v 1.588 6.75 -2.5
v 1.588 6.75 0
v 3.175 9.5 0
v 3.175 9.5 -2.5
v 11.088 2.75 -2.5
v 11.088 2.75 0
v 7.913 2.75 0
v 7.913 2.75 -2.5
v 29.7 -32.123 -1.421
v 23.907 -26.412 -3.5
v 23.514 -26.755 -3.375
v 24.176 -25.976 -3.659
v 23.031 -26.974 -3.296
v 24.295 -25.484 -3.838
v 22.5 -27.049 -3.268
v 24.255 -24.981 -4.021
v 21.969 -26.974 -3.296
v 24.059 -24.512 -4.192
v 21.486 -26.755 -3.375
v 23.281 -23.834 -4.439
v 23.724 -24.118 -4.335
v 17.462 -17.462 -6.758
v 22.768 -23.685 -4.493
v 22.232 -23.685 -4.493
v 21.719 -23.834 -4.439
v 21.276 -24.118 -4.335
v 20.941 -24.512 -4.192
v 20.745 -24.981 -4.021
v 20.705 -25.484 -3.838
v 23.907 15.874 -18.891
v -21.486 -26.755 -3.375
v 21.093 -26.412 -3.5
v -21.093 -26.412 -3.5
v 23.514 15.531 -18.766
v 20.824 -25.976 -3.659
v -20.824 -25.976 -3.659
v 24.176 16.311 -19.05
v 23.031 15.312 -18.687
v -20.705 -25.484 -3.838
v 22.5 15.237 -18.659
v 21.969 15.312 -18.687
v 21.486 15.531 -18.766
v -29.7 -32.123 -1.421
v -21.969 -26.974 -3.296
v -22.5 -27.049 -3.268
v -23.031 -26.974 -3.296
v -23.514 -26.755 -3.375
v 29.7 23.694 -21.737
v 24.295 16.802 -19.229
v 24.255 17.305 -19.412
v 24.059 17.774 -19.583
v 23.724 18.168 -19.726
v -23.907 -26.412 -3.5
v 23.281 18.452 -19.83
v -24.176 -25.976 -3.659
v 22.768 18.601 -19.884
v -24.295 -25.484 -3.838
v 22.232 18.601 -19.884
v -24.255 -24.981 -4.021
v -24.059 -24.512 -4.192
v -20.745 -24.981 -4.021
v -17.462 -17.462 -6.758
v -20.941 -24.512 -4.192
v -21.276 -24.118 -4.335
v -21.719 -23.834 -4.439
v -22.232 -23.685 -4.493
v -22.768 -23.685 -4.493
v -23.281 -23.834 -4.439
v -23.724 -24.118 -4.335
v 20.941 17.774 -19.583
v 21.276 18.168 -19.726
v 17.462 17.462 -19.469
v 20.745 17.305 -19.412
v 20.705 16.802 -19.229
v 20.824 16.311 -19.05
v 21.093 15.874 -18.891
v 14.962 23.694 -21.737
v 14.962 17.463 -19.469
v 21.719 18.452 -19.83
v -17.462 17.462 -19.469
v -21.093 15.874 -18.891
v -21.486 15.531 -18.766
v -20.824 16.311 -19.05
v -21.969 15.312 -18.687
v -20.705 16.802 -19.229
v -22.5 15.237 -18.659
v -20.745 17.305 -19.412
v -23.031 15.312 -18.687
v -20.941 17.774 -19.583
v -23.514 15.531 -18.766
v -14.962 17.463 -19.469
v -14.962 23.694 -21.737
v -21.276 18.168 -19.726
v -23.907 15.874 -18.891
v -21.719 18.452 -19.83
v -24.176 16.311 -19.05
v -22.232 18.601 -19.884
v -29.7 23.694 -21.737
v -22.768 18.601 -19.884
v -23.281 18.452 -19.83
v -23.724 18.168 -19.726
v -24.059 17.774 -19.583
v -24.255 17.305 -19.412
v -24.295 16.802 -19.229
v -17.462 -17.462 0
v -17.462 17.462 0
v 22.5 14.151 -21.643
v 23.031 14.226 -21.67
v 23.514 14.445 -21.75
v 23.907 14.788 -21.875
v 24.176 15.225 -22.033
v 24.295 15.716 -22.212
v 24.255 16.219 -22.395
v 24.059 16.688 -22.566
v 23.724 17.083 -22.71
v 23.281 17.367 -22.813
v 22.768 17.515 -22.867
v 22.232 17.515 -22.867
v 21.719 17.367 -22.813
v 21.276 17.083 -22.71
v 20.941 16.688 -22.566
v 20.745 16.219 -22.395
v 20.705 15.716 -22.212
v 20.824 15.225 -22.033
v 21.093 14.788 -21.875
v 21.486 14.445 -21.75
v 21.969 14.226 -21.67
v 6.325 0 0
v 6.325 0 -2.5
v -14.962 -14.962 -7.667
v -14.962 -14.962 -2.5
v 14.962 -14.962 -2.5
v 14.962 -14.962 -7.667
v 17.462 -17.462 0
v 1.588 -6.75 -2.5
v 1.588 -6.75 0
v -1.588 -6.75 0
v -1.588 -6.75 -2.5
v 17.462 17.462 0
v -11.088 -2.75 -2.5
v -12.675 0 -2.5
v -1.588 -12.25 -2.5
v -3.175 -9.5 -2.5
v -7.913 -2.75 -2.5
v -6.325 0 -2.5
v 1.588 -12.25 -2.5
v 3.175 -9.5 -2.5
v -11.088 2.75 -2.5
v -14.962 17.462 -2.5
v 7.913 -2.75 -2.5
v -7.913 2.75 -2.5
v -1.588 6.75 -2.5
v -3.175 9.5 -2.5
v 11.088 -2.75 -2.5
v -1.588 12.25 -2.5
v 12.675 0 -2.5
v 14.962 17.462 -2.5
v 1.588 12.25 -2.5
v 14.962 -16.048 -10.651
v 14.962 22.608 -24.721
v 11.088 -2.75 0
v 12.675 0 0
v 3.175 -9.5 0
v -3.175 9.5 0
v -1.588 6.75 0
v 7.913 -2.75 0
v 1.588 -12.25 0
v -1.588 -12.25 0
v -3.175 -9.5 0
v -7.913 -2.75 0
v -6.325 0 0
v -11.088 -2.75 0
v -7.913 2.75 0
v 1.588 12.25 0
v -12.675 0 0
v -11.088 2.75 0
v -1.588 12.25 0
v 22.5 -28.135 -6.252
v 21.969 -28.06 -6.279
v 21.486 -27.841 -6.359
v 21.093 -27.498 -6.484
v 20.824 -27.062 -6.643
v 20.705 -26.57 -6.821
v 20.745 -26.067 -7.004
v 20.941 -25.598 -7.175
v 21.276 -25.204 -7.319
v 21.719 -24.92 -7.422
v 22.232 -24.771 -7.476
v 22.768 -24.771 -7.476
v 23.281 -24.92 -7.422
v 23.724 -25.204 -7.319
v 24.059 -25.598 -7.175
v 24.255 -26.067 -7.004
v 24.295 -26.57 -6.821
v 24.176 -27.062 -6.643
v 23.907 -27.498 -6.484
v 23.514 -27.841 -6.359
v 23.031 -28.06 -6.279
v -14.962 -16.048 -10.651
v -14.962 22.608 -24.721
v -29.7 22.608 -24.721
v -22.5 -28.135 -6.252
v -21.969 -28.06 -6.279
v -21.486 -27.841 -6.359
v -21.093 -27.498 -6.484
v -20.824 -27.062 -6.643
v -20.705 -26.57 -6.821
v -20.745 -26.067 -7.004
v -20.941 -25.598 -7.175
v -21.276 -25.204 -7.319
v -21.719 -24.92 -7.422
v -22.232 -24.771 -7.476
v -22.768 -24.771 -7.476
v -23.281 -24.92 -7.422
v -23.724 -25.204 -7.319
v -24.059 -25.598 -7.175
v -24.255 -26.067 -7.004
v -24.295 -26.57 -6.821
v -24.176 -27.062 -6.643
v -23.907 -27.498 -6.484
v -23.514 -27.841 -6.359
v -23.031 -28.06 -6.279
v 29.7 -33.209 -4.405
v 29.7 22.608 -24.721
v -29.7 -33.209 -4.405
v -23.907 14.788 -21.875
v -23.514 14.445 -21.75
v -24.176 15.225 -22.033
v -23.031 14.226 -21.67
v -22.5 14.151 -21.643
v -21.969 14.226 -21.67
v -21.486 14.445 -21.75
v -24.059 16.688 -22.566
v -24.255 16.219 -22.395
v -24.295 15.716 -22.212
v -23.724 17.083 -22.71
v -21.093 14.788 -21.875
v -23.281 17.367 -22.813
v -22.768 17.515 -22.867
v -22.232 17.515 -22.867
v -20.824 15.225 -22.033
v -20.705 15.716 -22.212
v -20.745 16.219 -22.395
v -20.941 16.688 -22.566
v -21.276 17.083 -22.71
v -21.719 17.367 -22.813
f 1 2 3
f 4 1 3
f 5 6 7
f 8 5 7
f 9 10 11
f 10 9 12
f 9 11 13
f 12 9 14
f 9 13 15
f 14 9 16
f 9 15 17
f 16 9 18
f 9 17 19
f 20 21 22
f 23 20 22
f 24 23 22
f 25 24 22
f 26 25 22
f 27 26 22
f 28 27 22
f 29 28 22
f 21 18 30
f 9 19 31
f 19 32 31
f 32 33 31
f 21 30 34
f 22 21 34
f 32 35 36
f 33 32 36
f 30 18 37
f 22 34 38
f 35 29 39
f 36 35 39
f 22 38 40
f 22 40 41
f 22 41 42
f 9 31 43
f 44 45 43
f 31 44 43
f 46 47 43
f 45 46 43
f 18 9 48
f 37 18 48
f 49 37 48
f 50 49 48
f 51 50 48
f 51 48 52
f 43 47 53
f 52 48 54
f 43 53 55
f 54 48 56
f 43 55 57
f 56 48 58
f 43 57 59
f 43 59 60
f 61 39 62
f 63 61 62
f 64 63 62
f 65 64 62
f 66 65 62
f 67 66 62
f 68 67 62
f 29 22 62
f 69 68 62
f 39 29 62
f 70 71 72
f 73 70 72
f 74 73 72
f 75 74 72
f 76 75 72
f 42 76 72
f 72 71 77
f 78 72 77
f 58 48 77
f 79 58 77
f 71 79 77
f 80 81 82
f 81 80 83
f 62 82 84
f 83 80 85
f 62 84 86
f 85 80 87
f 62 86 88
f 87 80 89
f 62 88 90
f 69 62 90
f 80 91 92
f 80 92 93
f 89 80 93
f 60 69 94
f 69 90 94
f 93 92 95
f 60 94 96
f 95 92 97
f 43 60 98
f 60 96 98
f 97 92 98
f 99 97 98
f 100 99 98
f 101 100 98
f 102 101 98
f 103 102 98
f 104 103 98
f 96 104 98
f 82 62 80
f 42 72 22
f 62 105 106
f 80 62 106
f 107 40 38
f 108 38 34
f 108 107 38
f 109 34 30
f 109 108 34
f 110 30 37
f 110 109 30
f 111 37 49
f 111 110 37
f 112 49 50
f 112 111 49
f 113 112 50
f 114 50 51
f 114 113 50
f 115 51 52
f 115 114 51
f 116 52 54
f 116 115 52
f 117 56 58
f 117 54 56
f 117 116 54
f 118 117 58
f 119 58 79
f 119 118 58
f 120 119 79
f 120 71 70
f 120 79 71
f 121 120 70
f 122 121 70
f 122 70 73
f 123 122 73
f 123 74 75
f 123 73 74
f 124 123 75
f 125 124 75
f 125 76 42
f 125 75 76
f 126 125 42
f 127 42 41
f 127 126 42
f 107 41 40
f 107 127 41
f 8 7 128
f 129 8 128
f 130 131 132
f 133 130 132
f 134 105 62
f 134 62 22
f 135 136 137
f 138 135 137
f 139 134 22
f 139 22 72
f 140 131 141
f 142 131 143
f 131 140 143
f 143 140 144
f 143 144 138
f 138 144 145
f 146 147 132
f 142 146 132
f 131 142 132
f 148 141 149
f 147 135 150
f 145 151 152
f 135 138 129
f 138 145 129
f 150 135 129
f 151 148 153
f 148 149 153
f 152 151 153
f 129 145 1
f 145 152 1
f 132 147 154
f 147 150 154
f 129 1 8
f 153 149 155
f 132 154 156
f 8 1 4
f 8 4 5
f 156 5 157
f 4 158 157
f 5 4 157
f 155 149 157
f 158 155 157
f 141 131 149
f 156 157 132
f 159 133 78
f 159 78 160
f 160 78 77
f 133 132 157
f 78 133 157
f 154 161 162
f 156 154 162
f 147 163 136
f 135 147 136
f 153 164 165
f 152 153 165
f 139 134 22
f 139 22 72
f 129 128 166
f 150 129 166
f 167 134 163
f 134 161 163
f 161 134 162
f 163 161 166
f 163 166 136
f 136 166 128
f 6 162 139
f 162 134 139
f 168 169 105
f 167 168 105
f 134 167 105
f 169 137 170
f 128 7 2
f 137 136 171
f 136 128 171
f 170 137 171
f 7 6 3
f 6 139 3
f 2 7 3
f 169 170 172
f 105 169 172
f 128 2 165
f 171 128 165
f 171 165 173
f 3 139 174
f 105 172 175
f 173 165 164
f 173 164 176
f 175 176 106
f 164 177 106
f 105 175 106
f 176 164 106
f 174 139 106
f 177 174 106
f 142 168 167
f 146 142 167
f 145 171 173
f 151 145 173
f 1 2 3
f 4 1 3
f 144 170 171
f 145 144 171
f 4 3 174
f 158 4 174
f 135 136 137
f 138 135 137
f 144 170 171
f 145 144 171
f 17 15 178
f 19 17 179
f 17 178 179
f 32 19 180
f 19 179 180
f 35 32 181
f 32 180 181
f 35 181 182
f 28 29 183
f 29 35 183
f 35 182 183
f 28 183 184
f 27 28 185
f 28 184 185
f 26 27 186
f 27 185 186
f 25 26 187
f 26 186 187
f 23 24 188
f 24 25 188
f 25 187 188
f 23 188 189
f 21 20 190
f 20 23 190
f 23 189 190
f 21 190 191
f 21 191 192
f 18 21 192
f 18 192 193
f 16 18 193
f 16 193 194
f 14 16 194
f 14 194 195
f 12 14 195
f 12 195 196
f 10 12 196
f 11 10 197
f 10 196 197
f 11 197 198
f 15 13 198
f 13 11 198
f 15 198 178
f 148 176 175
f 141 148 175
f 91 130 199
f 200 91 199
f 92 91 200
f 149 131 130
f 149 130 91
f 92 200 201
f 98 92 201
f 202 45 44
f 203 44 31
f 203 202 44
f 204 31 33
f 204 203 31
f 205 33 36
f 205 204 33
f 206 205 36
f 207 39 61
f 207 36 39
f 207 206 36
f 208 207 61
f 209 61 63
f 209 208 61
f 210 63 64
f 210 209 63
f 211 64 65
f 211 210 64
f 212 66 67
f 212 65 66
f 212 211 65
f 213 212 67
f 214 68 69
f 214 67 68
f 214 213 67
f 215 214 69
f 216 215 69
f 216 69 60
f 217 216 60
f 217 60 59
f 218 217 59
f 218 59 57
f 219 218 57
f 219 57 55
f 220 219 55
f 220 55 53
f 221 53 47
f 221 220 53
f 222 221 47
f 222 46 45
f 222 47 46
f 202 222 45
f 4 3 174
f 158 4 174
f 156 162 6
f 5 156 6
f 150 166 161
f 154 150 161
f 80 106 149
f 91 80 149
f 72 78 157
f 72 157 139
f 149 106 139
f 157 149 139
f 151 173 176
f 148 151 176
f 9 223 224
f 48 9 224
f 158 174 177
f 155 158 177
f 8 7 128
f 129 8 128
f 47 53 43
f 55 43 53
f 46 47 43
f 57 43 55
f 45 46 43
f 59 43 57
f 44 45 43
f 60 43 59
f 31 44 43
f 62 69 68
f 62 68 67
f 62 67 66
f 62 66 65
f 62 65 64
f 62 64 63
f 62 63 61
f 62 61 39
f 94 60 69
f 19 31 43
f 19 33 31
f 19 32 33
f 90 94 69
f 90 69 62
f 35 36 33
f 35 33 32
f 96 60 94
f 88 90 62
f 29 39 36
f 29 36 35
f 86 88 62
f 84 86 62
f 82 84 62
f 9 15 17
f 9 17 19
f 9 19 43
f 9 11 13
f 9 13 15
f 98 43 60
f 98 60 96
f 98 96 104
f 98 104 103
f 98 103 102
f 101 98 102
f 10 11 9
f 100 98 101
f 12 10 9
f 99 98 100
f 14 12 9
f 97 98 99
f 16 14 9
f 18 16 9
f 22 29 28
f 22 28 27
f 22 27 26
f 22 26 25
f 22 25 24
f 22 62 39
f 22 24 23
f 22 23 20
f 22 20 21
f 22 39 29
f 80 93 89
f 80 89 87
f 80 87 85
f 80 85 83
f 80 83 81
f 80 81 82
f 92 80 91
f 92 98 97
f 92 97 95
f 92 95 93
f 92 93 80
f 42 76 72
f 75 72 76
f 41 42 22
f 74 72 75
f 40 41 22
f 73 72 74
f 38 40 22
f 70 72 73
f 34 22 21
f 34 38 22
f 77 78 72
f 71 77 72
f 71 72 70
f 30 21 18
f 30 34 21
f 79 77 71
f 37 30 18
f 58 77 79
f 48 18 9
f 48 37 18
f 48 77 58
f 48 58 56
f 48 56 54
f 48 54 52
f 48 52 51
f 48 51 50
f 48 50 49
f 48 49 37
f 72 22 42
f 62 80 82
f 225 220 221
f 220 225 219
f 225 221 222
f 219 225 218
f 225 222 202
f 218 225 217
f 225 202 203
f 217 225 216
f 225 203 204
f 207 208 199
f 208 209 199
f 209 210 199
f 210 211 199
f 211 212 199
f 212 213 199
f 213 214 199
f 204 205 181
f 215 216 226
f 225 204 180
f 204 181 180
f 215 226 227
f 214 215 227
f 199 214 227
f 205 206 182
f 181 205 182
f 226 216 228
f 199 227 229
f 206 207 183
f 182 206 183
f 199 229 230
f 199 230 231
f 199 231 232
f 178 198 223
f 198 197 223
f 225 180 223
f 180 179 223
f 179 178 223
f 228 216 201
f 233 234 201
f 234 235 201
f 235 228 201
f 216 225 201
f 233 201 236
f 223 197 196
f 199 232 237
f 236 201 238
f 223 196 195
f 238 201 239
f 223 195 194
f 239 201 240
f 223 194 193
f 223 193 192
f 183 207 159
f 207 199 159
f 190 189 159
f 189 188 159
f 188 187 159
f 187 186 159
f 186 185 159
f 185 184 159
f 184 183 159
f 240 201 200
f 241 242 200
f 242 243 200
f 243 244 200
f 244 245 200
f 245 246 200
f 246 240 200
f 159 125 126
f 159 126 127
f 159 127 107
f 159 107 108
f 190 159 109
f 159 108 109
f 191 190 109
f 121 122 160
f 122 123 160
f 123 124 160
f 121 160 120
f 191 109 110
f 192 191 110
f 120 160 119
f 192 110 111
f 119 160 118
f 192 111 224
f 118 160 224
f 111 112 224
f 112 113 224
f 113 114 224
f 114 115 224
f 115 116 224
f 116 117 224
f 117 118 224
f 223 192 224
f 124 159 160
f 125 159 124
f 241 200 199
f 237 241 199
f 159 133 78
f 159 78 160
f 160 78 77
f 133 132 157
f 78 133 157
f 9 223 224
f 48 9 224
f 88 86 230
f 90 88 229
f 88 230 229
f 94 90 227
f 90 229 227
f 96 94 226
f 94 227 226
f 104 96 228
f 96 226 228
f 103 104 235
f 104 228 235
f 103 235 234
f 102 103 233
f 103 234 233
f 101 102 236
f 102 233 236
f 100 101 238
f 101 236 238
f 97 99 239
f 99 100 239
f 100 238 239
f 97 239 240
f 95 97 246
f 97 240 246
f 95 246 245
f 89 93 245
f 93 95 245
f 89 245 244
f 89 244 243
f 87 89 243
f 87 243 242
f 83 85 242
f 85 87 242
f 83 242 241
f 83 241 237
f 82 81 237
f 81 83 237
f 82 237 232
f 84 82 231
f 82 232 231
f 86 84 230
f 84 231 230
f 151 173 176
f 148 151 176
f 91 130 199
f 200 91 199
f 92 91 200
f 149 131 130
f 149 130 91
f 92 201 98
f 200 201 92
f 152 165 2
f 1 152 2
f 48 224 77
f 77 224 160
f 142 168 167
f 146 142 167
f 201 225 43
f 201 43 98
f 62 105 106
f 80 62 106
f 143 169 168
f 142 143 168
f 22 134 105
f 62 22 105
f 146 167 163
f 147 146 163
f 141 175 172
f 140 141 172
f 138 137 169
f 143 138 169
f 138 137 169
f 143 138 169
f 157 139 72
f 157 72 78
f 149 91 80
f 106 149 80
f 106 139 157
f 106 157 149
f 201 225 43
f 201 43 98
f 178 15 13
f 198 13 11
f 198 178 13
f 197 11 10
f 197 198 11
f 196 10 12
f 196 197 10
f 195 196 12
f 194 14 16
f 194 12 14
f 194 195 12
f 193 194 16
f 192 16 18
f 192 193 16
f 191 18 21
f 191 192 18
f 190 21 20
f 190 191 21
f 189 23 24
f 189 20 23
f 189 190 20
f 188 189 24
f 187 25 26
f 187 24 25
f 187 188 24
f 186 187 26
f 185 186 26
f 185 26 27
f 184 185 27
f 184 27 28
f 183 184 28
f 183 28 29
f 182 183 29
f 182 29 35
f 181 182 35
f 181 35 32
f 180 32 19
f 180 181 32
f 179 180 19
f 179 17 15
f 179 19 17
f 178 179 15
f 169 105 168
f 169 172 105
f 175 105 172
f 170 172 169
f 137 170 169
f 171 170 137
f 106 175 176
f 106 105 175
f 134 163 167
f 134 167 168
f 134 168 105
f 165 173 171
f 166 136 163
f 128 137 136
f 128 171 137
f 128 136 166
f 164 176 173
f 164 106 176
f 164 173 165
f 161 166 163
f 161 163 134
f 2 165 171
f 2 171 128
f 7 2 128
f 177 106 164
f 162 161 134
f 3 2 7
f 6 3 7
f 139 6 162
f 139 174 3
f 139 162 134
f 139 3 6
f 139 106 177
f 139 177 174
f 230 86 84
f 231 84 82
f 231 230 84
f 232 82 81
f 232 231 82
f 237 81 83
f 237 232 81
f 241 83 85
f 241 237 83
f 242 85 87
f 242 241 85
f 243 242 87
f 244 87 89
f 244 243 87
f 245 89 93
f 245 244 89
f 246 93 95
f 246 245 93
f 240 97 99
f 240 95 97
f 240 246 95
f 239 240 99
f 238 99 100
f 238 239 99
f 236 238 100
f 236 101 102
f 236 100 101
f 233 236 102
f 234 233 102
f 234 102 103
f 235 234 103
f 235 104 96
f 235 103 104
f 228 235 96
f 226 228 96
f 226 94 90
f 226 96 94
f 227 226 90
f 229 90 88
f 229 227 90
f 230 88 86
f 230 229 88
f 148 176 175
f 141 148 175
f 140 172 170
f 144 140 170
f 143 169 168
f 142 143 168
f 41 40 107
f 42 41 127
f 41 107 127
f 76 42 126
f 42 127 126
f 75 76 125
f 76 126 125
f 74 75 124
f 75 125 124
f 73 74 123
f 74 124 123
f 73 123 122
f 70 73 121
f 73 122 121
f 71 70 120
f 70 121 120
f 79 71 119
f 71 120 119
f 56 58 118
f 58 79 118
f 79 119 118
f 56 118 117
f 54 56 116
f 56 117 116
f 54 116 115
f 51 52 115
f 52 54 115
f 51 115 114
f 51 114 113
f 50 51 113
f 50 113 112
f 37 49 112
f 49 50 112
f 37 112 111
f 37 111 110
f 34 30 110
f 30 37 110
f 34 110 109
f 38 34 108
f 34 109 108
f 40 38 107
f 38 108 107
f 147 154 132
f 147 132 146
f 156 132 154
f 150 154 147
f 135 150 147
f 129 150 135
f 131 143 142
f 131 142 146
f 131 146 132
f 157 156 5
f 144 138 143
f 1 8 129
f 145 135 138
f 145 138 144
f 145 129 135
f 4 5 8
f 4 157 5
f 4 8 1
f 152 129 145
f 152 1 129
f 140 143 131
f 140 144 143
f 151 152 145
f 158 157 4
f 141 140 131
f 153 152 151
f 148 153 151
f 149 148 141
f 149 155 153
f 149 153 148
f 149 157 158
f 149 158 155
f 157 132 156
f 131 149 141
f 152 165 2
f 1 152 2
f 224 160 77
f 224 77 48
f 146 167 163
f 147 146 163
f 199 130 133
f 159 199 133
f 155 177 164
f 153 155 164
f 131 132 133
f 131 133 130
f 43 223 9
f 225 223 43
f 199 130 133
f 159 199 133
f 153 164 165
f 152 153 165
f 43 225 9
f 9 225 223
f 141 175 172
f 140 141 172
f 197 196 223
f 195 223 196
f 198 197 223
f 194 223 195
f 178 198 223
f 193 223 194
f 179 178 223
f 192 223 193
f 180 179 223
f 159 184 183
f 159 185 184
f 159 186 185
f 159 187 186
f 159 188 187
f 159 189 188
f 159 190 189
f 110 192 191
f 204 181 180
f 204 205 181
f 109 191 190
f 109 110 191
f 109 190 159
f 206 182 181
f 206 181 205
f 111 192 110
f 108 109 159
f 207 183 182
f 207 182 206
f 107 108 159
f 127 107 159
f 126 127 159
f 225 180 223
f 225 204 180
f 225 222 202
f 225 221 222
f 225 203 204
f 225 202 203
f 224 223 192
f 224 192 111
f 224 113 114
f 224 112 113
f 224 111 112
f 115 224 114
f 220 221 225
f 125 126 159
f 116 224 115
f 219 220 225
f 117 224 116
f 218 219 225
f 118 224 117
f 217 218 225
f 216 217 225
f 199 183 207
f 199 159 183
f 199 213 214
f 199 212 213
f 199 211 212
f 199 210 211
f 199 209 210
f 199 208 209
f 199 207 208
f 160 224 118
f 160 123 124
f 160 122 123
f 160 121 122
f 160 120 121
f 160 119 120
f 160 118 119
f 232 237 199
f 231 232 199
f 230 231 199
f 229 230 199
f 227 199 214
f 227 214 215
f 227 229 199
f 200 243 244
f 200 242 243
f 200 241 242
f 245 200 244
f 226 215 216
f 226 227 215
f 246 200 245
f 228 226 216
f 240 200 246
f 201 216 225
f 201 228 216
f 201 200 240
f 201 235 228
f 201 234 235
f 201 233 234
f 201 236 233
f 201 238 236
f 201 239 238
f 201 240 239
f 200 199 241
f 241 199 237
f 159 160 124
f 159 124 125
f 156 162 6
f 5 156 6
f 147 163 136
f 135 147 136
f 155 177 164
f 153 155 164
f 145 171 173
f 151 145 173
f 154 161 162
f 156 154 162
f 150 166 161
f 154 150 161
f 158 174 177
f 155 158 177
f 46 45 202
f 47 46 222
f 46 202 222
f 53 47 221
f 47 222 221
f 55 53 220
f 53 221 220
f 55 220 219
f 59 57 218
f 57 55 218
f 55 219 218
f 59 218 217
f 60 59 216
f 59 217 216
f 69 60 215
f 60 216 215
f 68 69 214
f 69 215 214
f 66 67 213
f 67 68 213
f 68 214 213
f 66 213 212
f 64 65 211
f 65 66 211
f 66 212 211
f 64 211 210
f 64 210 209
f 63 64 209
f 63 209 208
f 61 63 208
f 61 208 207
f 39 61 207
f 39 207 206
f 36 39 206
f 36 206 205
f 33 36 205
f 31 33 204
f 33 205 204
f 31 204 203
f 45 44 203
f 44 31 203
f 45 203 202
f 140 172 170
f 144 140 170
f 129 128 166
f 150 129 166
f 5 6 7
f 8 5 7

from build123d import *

# Parameters (mm, degrees)
SKETCH5_W           = 59.399999564
SKETCH5_H           = 59.399999564
BOSS_EXTRUDE3_DEPTH = 3.175
BOSS_EXTRUDE4_REACH = 52.952
SKETCH1_W           = 34.925
SKETCH1_H           = 34.925
SKETCH5_5_R         = 1.799999956
CUT_EXTRUDE5_DEPTH  = 44.987110755
SHELL1_T            = -2.5
SKETCH8_R           = 1.56250005
CUT_EXTRUDE4_DEPTH  = 2.5
SKETCH10_W          = 10
SKETCH10_H          = 6
CUT_EXTRUDE7_DEPTH  = 3.175
CUT_EXTRUDE9_DEPTH  = 2.5
SKETCH16_W          = 29.925
SKETCH16_H          = 41.137726754
CUT_EXTRUDE11_DEPTH = 44.537192462


# Read off the part's stored shape, not the designer's step: Split1
with BuildPart() as part:
    # Sketch5 → Boss-Extrude3 (new body)
    with BuildSketch(Plane(origin=(0, -5.300466321, -14.56291153), x_dir=(1, 0, 0), z_dir=(0, 0.3420201433256694, 0.9396926207859082))):
        Rectangle(SKETCH5_W, SKETCH5_H)
    extrude(amount=BOSS_EXTRUDE3_DEPTH)

    # Boss-Extrude4: up to this plane
    boss_extrude4_end = Plane(origin=(0, -4.214552366, -11.579387459), z_dir=(0, 0.34202014332566943, 0.9396926207859083))
    # Sketch1 → Boss-Extrude4 (add, up to the surface)
    with BuildSketch(Plane.XY, mode=Mode.PRIVATE) as boss_extrude4_sk1:
        Rectangle(SKETCH1_W, SKETCH1_H)
    boss_extrude4_tool1 = split(extrude(boss_extrude4_sk1.sketch, amount=-BOSS_EXTRUDE4_REACH, mode=Mode.PRIVATE), bisect_by=boss_extrude4_end, keep=Keep.BOTH, mode=Mode.PRIVATE)
    add(boss_extrude4_tool1.solids().sort_by_distance((0, 0, 0))[0])

    # Sketch5<5> → Cut-Extrude5 (cut, through all)
    with BuildSketch(Plane(origin=(0, -5.300466321, -14.56291153), x_dir=(1, 0, 0), z_dir=(0, 0.3420201433256694, 0.9396926207859082))):
        with Locations(Location((-22.499999958, -22.499999958, 0), (0, 0, 270))):
            Circle(SKETCH5_5_R)
        with Locations(Location((-22.499999958, 22.499999958, 0), (0, 0, 270))):
            Circle(SKETCH5_5_R)
        with Locations(Location((22.499999958, 22.499999958, 0), (0, 0, 270))):
            Circle(SKETCH5_5_R)
        with Locations(Location((22.499999958, -22.499999958, 0), (0, 0, 270))):
            Circle(SKETCH5_5_R)
    extrude(amount=CUT_EXTRUDE5_DEPTH, mode=Mode.SUBTRACT)


with BuildPart() as body_2:
    # Split1: the piece on the far side of the plane
    add(part.part)
    split(bisect_by=Plane(origin=(0, -4.214552366, -11.579387459), x_dir=(1, 0, 0), z_dir=(0, 0.3420201433256691, 0.9396926207859083)), keep=Keep.BOTTOM)


with BuildPart() as part_1:
    add(part.part)

    # Split1
    split(bisect_by=Plane(origin=(0, -4.214552366, -11.579387459), x_dir=(1, 0, 0), z_dir=(0, 0.3420201433256691, 0.9396926207859083)), keep=Keep.TOP)

    # Shell1
    shell1_openings = [part_1.faces().sort_by_distance(p)[0] for p in [
        (0, 17.4625, -9.734594643),
        (0, 0, -13.113359071),
    ]]
    offset(amount=SHELL1_T, openings=shell1_openings, kind=Kind.INTERSECTION)

    # Sketch8 → Cut-Extrude4 (cut)
    with BuildSketch(Plane.XY):
        with Locations((0, 9.50000005)):
            Circle(SKETCH8_R)
        with Locations((9.50000005, 0)):
            Circle(SKETCH8_R)
        with Locations((0, -9.50000005)):
            Circle(SKETCH8_R)
        with Locations((-9.50000005, 0)):
            Circle(SKETCH8_R)
    extrude(amount=-CUT_EXTRUDE4_DEPTH, mode=Mode.SUBTRACT)

    # Combine1: union body 2
    add(body_2.part)


with BuildPart() as body_2_2:
    # Mirror4: mirrored copy
    add(part_1.part.mirror(Plane(origin=(0, 0, 0), x_dir=(0, 0, 1), z_dir=(1, 0, 0))))


with BuildPart() as cut_extrude7_tool:
    # Sketch10 → Cut-Extrude7 (new body)
    with BuildSketch(Plane(origin=(0, -5.300466321, -14.56291153), x_dir=(-1, 0, 0), z_dir=(0, -0.3420201433256695, -0.9396926207859082))):
        with Locations((4, 11)):
            Rectangle(SKETCH10_W, SKETCH10_H)
    extrude(amount=-CUT_EXTRUDE7_DEPTH)


with BuildPart() as part_2:
    add(part_1.part)

    # Cut-Extrude7: cut by cut_extrude7_tool
    add(cut_extrude7_tool.part, mode=Mode.SUBTRACT)


with BuildPart() as body_2_2_1:
    add(body_2_2.part)

    # Cut-Extrude7: cut by cut_extrude7_tool
    add(cut_extrude7_tool.part, mode=Mode.SUBTRACT)


with BuildPart() as cut_extrude9_tool:
    # Sketch11 → Cut-Extrude9 (new body)
    with BuildSketch(Plane.XY):
        Polygon((1.5875, 12.249630707), (-1.5875, 12.249630707), (-3.175, 9.50000005), (-1.5875, 6.750369393), (1.5875, 6.750369393), (3.175, 9.50000005), align=None)
        Polygon((11.08750005, 2.749630657), (7.91250005, 2.749630657), (6.32500005, 0), (7.91250005, -2.749630657), (11.08750005, -2.749630657), (12.67500005, 0), align=None)
        Polygon((1.5875, -6.750369393), (-1.5875, -6.750369393), (-3.175, -9.50000005), (-1.5875, -12.249630707), (1.5875, -12.249630707), (3.175, -9.50000005), align=None)
        Polygon((-7.91250005, 2.749630657), (-11.08750005, 2.749630657), (-12.67500005, 0), (-11.08750005, -2.749630657), (-7.91250005, -2.749630657), (-6.32500005, 0), align=None)
    extrude(amount=-CUT_EXTRUDE9_DEPTH)


with BuildPart() as part_3:
    add(part_2.part)

    # Cut-Extrude9: cut by cut_extrude9_tool
    add(cut_extrude9_tool.part, mode=Mode.SUBTRACT)


with BuildPart() as body_2_2_2:
    add(body_2_2_1.part)

    # Cut-Extrude9: cut by cut_extrude9_tool
    add(cut_extrude9_tool.part, mode=Mode.SUBTRACT)


with BuildPart() as cut_extrude11_tool:
    # Sketch16 → Cut-Extrude11 (new, through all)
    with BuildSketch(Plane(origin=(0, -4.214552366, -11.579387459), x_dir=(1, 0, 0), z_dir=(0, 0.34202014332566943, 0.9396926207859083))):
        with Locations((0, 9.131136405)):
            Rectangle(SKETCH16_W, SKETCH16_H)
    extrude(amount=-CUT_EXTRUDE11_DEPTH)


with BuildPart() as part_4:
    add(part_3.part)

    # Cut-Extrude11: cut by cut_extrude11_tool
    add(cut_extrude11_tool.part, mode=Mode.SUBTRACT)


with BuildPart() as body_2_2_3:
    add(body_2_2_2.part)

    # Cut-Extrude11: cut by cut_extrude11_tool
    add(cut_extrude11_tool.part, mode=Mode.SUBTRACT)


solid = Compound([part_4.part, body_2_2_3.part])
